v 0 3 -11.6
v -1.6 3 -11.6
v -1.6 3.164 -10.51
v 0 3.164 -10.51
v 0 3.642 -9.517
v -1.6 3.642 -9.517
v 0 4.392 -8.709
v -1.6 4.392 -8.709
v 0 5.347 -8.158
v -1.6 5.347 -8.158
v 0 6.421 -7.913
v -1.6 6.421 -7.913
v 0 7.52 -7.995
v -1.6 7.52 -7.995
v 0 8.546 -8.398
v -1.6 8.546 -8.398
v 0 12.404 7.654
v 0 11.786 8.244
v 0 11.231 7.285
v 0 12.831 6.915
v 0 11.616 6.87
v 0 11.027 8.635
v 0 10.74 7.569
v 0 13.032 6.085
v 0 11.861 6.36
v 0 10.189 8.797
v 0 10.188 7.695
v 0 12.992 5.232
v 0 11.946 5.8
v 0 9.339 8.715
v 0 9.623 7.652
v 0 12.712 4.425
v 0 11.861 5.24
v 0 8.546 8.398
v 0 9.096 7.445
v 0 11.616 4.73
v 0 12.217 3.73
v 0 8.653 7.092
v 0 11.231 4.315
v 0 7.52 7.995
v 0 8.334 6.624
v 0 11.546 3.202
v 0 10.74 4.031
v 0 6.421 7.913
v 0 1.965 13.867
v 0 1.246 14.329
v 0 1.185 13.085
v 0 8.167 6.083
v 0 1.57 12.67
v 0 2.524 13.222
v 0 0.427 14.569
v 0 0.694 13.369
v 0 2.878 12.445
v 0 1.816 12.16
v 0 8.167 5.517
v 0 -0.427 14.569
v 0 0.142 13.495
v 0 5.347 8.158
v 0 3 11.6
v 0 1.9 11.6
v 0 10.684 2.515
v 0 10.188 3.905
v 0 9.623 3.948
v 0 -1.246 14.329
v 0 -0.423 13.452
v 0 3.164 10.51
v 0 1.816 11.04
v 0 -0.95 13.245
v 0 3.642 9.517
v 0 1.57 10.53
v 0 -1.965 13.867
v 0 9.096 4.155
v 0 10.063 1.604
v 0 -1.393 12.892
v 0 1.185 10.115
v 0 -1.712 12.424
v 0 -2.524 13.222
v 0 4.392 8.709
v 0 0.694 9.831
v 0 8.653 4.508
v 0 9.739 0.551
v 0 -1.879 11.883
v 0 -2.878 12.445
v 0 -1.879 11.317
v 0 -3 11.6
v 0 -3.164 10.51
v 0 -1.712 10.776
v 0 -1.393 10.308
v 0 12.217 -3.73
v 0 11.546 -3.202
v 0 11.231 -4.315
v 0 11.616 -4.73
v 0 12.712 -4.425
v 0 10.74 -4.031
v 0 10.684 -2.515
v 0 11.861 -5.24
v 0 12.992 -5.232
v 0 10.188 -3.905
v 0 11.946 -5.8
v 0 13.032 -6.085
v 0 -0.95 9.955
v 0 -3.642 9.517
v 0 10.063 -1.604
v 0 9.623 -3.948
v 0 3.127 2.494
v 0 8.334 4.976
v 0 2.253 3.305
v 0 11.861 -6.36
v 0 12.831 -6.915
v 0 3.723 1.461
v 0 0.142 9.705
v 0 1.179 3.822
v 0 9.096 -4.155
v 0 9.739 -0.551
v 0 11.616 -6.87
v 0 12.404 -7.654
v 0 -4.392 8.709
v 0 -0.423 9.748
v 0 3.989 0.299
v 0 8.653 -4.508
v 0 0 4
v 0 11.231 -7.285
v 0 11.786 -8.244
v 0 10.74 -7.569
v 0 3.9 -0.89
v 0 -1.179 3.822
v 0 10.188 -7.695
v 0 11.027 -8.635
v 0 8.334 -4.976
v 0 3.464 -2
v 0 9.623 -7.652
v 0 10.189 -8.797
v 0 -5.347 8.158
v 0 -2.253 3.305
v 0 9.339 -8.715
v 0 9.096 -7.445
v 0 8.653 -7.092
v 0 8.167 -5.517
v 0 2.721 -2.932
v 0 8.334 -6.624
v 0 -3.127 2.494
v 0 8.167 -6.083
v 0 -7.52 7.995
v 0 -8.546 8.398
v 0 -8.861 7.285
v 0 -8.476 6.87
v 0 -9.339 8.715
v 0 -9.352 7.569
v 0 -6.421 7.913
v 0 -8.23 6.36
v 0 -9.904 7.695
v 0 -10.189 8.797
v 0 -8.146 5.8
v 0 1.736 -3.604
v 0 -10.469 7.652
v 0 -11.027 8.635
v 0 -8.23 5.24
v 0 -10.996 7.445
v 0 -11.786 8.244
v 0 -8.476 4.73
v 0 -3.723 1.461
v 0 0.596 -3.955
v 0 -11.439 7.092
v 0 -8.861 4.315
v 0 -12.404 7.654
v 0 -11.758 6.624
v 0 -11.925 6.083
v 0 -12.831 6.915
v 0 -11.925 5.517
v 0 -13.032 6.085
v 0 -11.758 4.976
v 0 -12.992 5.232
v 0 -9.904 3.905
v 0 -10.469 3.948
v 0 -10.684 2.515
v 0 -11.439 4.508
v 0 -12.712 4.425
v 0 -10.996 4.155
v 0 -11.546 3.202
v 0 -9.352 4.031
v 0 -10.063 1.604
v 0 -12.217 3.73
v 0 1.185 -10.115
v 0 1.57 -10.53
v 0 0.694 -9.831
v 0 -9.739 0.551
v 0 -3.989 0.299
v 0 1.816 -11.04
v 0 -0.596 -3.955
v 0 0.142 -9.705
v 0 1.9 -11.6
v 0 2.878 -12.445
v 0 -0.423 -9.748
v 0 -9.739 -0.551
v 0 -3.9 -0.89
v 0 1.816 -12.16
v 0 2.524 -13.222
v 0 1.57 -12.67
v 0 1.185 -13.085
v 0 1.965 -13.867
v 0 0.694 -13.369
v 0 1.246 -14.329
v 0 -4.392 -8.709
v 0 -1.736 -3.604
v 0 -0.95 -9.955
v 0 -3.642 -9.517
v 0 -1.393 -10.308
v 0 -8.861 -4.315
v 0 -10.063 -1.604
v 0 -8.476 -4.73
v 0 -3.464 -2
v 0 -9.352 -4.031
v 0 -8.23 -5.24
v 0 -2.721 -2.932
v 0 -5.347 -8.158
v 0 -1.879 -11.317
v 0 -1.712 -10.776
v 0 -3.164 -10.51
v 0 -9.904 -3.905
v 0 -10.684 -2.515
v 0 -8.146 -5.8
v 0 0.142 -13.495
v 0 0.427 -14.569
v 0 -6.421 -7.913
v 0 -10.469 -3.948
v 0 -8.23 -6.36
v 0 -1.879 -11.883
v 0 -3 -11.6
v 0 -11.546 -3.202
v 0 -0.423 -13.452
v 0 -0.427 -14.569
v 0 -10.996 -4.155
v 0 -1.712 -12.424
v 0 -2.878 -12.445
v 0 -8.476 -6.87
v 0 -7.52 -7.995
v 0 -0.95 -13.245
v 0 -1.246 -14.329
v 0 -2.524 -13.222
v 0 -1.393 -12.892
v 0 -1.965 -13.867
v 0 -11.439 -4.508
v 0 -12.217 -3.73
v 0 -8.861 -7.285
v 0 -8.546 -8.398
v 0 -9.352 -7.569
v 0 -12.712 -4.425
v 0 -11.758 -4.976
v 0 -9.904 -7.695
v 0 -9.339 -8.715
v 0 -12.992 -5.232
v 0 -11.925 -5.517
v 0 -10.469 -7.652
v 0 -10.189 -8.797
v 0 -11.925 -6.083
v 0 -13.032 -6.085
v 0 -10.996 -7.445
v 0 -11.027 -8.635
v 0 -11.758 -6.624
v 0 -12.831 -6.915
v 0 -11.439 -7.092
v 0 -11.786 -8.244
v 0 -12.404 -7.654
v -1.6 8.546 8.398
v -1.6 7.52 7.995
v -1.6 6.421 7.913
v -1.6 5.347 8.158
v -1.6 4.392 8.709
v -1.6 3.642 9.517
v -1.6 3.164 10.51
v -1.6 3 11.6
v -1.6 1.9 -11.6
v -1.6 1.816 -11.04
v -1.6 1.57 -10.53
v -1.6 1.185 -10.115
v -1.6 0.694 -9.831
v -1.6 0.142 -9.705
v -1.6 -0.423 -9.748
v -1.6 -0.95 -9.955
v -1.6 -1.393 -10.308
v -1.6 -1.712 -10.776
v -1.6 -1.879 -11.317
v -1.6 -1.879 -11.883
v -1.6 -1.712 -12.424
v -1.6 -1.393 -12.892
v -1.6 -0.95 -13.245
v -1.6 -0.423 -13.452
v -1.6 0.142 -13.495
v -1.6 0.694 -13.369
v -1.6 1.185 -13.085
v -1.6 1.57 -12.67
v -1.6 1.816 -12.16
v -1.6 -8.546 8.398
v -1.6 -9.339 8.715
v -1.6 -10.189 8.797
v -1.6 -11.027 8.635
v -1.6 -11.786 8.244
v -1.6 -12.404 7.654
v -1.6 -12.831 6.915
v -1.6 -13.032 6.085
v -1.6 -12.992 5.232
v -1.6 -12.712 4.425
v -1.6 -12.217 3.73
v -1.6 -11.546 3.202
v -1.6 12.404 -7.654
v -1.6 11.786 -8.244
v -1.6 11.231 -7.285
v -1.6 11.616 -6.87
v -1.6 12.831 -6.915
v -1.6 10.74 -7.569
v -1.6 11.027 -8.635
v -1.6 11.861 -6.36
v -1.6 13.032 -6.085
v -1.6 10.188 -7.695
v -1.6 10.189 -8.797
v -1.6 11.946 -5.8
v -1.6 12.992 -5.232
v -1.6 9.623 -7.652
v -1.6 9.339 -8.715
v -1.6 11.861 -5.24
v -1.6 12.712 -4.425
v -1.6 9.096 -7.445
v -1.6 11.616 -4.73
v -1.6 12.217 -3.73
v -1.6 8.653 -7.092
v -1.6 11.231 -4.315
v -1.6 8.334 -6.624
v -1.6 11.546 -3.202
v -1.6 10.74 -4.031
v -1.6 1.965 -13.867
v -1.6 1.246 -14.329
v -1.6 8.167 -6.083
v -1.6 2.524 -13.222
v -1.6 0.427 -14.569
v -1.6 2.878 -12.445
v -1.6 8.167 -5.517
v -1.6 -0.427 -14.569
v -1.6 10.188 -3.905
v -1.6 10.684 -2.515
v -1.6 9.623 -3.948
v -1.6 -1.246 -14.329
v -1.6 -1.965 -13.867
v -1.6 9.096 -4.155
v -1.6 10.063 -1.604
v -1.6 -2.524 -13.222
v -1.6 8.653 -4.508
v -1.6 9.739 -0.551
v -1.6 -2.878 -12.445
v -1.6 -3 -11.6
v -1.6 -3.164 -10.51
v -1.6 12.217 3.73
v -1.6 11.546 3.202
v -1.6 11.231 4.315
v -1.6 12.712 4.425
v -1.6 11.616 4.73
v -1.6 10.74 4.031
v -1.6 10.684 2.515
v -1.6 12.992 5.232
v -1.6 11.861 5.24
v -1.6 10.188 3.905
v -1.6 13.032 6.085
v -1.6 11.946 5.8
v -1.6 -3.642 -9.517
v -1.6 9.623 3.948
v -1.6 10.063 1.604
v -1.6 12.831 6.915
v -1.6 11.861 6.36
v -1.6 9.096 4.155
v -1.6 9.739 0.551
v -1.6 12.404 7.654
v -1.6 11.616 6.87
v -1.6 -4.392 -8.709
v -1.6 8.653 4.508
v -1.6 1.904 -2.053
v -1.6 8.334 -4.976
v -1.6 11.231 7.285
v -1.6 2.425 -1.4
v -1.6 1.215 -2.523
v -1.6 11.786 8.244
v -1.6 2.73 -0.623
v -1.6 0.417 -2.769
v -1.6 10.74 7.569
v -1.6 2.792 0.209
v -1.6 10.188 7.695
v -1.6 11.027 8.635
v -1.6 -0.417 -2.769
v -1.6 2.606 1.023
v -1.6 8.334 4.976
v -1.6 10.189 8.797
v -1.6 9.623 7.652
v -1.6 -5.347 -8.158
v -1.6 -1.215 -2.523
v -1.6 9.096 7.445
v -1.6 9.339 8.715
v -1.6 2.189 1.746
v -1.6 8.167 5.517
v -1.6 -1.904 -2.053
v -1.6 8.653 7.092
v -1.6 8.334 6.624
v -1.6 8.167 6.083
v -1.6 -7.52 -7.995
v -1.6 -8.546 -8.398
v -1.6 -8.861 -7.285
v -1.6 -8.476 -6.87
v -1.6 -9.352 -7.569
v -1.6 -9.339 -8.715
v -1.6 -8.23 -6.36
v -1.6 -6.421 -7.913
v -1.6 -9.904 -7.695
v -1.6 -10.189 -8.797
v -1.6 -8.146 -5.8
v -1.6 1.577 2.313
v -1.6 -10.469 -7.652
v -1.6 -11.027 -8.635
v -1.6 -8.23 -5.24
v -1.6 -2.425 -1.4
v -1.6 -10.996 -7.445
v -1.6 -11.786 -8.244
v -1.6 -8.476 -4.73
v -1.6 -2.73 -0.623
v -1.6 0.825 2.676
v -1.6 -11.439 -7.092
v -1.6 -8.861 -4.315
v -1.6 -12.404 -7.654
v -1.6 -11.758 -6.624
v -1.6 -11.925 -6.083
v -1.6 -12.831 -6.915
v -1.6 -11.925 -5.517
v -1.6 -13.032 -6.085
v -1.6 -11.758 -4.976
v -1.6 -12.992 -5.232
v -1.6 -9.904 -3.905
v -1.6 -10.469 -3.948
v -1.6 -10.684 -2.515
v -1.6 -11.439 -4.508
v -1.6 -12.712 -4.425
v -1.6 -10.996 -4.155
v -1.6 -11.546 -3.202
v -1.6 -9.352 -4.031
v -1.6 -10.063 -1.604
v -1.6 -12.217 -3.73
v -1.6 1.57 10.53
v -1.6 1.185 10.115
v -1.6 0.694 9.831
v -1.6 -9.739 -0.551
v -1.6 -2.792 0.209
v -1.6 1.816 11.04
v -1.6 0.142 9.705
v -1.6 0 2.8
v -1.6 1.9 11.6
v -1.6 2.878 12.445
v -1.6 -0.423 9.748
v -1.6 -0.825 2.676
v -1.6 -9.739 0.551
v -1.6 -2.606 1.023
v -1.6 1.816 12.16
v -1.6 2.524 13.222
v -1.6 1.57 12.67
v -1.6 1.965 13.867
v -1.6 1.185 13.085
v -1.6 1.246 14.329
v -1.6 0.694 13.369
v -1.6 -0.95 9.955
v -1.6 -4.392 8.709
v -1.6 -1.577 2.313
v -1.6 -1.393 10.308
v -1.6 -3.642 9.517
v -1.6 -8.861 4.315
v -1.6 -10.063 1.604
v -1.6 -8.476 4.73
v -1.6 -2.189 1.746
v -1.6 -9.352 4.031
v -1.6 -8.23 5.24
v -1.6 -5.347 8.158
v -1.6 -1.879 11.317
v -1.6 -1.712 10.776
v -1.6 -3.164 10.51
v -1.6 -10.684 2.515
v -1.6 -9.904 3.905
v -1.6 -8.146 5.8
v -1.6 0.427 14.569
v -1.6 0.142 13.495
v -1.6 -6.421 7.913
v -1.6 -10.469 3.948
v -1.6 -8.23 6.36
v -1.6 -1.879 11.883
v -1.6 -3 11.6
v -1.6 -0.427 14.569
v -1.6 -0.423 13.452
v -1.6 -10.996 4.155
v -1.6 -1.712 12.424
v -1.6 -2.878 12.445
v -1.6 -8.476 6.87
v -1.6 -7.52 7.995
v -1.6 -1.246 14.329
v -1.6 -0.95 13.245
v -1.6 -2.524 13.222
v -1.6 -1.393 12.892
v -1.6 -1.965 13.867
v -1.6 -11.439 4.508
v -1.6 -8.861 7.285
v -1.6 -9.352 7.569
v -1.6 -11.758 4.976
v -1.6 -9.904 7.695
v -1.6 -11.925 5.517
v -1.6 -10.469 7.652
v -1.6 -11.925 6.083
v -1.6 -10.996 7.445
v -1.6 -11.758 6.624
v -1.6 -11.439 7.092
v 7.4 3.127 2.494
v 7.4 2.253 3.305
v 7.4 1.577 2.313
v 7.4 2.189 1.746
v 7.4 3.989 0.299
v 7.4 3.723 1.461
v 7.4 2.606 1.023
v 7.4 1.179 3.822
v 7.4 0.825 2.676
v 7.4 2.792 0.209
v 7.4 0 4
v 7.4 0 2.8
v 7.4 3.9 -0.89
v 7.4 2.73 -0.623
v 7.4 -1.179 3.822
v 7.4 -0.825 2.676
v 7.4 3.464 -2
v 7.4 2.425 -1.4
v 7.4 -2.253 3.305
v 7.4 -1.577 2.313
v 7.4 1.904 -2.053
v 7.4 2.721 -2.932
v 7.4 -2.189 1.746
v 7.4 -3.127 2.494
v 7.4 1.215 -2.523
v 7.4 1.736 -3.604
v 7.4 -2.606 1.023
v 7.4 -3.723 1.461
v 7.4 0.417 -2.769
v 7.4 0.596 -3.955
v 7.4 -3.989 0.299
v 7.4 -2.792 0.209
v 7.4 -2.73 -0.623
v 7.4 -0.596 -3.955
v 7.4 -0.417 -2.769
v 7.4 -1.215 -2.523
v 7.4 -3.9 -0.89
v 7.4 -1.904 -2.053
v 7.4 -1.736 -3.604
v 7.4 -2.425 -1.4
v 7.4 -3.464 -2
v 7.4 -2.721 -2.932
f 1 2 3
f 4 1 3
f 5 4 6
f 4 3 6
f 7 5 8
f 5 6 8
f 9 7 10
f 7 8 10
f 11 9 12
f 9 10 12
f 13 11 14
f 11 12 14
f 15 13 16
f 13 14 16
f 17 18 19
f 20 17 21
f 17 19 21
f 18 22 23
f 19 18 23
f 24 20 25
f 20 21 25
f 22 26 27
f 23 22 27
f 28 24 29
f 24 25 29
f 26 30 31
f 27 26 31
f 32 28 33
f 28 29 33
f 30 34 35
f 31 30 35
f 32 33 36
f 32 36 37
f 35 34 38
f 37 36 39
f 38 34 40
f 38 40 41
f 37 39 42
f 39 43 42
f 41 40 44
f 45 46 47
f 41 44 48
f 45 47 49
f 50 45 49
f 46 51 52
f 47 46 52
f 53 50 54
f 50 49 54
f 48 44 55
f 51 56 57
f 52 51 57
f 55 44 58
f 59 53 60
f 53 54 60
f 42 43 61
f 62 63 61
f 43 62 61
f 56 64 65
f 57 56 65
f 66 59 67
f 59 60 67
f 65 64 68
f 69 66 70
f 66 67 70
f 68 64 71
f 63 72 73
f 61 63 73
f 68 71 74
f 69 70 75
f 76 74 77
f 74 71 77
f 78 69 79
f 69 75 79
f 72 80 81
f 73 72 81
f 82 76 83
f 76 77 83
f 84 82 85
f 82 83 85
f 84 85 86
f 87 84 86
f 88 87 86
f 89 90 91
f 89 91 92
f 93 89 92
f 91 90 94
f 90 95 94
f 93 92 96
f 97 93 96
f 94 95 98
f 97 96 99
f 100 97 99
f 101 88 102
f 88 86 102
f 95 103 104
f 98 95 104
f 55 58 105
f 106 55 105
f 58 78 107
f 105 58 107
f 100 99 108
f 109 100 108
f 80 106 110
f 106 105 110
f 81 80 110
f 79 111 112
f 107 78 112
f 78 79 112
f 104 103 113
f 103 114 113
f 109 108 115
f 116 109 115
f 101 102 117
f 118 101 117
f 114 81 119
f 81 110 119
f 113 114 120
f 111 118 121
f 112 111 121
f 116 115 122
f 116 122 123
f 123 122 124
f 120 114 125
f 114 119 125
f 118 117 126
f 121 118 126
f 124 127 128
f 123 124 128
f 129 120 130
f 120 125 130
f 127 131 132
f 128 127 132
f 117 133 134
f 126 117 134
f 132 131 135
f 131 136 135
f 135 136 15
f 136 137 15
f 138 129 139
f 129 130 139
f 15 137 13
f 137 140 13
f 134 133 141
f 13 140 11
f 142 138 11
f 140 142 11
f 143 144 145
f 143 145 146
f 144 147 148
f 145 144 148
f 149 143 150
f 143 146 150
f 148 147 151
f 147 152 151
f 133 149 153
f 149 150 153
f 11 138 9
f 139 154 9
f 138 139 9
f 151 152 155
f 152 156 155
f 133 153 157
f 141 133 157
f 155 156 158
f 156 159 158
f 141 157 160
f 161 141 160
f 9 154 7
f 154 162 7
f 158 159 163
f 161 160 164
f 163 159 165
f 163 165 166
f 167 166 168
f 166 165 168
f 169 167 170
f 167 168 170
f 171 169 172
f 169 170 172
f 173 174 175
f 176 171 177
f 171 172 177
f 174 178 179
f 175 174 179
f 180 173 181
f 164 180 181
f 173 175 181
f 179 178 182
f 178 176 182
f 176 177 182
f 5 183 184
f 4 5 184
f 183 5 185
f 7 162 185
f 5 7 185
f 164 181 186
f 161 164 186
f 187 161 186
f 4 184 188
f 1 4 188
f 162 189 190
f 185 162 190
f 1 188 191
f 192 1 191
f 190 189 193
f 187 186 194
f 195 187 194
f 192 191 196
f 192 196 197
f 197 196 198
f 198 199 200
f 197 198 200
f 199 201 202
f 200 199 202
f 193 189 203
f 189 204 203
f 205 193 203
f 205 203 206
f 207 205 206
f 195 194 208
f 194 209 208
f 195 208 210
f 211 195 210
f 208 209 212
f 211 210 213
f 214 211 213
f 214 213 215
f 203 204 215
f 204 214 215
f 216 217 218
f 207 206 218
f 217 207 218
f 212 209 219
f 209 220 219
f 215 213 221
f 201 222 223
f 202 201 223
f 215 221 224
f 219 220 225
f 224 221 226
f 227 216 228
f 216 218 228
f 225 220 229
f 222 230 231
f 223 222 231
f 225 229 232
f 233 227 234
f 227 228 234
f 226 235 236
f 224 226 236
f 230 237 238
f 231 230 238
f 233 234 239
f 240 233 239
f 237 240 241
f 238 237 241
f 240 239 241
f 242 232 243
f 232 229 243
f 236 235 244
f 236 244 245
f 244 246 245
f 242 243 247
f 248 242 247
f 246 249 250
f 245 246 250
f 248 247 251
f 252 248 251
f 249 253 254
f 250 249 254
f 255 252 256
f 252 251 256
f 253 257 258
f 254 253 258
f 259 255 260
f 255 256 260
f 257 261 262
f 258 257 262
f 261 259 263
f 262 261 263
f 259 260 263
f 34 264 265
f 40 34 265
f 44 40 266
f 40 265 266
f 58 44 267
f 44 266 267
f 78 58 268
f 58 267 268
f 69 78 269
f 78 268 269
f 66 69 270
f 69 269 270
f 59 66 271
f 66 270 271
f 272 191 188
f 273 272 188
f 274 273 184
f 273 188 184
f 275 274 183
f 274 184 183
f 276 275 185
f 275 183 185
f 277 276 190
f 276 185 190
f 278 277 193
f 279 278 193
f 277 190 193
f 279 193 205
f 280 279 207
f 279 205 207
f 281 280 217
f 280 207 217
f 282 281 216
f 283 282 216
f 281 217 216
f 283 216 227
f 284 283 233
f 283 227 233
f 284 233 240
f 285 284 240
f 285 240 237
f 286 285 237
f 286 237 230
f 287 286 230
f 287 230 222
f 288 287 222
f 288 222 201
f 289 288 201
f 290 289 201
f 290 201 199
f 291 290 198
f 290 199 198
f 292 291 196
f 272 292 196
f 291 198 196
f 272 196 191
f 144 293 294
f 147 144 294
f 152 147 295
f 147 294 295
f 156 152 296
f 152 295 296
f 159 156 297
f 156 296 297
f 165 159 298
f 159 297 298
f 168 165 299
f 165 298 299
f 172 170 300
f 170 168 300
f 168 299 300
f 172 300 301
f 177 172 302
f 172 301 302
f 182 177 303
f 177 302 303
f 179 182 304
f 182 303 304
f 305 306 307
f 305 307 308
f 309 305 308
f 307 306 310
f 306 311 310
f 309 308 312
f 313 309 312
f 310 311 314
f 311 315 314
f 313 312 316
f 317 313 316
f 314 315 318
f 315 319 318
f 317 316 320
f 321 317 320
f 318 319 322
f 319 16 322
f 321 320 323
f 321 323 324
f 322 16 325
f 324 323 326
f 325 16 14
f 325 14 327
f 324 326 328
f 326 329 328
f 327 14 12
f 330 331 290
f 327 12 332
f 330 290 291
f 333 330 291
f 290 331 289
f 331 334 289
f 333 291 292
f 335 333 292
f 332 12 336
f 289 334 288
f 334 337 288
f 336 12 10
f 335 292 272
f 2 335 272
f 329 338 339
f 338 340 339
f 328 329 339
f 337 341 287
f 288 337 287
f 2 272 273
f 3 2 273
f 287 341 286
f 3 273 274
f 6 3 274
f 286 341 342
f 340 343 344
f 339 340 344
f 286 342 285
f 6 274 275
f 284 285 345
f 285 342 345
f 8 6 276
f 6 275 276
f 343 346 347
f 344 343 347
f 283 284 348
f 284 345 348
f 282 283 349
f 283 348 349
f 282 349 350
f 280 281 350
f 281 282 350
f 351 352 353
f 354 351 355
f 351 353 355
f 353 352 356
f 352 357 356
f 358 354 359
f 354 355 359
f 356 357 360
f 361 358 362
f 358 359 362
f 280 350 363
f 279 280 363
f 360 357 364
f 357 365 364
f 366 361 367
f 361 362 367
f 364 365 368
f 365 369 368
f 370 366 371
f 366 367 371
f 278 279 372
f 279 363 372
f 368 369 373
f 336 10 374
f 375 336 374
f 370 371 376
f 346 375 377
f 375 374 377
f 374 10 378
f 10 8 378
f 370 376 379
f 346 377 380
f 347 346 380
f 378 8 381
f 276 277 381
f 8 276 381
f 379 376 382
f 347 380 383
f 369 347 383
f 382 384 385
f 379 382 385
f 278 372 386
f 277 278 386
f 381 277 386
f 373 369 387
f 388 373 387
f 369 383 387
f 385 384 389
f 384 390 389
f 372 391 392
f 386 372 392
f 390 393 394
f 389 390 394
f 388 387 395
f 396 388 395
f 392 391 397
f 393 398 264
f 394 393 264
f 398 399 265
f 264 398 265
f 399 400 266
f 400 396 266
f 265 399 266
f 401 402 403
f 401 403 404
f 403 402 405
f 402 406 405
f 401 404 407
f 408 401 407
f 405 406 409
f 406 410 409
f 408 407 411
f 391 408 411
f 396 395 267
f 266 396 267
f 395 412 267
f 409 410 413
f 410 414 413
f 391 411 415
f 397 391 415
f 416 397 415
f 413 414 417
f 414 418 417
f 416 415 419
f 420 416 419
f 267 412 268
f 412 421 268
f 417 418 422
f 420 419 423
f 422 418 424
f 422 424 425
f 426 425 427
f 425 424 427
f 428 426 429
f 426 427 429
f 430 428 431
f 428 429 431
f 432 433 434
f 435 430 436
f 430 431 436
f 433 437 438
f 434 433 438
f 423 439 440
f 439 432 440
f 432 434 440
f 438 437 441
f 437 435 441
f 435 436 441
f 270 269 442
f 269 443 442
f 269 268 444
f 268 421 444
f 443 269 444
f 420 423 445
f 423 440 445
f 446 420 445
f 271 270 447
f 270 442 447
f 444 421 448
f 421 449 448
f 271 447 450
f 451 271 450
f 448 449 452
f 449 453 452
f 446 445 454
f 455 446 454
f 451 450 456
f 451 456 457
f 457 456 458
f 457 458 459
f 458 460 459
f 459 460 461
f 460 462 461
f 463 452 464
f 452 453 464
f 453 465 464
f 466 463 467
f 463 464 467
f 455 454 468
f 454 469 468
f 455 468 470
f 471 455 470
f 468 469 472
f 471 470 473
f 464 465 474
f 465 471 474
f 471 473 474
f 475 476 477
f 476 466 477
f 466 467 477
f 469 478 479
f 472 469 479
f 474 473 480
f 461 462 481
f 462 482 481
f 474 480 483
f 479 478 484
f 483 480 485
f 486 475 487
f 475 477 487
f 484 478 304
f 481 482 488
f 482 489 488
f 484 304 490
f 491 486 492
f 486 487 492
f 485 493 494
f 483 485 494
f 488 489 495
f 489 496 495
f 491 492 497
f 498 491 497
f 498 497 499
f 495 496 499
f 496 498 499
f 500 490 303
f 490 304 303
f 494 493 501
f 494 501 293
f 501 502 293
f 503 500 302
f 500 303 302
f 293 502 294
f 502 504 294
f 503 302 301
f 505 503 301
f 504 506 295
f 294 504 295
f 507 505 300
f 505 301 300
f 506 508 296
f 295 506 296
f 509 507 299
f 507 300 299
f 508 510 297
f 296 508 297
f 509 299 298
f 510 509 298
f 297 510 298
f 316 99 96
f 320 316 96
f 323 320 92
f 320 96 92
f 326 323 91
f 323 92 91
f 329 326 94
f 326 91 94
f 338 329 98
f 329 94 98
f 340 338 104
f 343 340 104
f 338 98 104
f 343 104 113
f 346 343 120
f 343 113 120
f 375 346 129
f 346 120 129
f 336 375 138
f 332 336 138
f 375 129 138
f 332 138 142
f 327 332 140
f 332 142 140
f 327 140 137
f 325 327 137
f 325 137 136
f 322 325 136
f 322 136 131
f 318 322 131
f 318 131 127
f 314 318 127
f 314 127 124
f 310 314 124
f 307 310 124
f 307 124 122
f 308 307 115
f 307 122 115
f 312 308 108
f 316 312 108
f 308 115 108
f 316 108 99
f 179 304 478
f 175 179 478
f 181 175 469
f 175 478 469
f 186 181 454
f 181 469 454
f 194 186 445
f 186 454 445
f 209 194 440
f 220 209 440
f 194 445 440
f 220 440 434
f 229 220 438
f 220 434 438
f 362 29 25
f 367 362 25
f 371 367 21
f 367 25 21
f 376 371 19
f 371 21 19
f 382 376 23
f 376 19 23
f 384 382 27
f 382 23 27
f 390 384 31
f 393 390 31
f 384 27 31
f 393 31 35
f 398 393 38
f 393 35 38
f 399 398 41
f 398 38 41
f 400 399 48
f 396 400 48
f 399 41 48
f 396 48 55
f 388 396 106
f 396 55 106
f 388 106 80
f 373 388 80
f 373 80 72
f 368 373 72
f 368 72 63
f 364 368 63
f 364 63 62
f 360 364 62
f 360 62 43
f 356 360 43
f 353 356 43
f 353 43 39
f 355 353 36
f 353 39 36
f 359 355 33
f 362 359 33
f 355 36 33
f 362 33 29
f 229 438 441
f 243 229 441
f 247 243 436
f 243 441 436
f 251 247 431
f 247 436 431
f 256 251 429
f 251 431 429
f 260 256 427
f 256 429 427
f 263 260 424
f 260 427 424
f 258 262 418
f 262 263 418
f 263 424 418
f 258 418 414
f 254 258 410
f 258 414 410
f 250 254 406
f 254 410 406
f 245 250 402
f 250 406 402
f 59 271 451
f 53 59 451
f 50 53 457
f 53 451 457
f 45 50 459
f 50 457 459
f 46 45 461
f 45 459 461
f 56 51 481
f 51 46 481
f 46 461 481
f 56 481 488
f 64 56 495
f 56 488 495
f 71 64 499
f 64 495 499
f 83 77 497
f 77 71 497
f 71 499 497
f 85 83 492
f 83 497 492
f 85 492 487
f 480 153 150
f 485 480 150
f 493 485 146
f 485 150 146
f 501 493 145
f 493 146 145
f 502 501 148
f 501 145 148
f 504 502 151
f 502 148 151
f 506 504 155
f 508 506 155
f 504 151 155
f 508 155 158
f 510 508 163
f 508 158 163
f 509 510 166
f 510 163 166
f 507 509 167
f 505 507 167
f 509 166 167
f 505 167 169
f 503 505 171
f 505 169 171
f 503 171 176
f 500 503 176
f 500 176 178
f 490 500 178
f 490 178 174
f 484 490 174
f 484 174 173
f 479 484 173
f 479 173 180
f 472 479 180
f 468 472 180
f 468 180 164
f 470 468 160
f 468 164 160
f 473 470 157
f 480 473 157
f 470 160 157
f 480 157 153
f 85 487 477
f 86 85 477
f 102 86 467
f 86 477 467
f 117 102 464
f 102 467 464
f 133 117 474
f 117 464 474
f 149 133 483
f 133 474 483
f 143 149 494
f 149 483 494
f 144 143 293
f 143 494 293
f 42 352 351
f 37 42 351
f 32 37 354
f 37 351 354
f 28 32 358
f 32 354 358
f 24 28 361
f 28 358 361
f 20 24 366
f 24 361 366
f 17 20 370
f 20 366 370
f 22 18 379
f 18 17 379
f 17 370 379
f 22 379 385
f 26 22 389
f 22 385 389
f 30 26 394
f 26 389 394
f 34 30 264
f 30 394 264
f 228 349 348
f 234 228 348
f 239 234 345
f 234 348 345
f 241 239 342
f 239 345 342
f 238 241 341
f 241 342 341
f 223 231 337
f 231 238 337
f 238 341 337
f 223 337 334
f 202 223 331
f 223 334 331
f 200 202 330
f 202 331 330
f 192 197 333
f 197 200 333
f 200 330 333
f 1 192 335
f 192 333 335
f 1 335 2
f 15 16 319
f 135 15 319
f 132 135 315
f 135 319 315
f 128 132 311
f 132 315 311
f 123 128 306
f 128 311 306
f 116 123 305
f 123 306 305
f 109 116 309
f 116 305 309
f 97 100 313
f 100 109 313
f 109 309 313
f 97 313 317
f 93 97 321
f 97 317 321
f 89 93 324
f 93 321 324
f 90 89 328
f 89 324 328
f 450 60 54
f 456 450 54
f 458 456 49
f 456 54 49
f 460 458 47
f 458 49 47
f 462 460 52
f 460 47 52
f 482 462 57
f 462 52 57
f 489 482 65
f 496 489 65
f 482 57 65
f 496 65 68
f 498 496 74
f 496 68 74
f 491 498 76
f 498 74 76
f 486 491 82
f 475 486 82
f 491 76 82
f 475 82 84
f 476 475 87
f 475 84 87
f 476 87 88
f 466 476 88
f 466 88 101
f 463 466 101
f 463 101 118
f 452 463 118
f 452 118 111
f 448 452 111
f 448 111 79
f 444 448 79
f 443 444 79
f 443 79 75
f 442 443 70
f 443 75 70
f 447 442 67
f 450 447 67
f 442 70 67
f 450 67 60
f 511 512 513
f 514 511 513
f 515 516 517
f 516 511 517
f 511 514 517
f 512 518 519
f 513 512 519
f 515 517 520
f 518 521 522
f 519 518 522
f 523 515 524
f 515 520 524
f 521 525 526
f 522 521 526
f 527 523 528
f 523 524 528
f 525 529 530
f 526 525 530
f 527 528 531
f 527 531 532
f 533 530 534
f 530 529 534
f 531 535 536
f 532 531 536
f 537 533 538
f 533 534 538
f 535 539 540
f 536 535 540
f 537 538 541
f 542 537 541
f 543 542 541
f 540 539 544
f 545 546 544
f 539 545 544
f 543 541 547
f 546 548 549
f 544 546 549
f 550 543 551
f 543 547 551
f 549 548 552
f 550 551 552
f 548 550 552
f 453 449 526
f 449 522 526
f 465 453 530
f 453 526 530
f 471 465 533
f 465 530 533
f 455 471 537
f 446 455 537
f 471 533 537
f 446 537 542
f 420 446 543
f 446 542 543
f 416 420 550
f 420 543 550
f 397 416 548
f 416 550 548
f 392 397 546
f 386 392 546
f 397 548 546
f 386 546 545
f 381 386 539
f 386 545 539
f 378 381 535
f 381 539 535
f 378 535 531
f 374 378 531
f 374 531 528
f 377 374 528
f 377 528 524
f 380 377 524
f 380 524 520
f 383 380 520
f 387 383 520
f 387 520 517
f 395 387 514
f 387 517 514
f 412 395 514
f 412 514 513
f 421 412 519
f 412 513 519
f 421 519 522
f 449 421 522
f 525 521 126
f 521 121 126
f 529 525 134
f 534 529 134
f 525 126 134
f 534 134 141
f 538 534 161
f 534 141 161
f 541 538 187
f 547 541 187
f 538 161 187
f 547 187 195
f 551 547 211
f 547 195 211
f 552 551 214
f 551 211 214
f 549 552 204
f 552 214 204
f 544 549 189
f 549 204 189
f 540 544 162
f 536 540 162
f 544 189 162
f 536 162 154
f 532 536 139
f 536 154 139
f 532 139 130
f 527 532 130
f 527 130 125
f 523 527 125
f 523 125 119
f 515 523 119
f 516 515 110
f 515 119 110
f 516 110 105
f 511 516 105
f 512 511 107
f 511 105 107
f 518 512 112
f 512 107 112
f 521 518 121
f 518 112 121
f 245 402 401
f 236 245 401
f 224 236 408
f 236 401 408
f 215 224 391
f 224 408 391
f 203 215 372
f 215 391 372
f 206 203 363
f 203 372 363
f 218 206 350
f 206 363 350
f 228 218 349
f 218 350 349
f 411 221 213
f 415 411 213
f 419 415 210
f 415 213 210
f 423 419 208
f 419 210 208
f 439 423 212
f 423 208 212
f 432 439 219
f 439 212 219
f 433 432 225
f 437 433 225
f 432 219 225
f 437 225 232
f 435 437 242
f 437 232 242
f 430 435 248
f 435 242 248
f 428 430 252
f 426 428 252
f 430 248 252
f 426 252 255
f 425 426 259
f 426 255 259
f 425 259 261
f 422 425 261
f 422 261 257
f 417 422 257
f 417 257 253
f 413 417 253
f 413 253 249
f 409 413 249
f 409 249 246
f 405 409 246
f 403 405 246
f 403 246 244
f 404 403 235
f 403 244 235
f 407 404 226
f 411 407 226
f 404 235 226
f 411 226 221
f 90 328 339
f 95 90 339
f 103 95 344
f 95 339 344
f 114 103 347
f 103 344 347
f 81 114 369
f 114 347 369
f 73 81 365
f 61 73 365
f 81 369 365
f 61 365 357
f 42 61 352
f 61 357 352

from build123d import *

# Parameters (mm, degrees)
F2_R     = 1.9
F3_DEPTH = 1.6
F5_START = -1.601
F5_DEPTH = 9.002


with BuildPart() as f1:
    # F0 (on Front) → F1 (revolve)
    with BuildSketch(Plane.XZ):
        Polygon((-1.6, 14.6), (-1.6, 2.8), (7.4, 2.8), (7.4, 4), (0, 4), (0, 14.6), align=None)
    revolve(axis=Axis((3.7, 0, 0), (1, 0, 0)))

    # F2 (on Right) → F3 (cut, through all)
    with BuildSketch(Plane.YZ):
        with Locations((0, 11.6)):
            Circle(F2_R)
        with Locations((-10.0458946839, 5.8)):
            Circle(F2_R)
        with Locations((-10.0458946839, -5.8)):
            Circle(F2_R)
        with Locations((0, -11.6)):
            Circle(F2_R)
        with Locations((10.0458946839, -5.8)):
            Circle(F2_R)
        with Locations((10.0458946839, 5.8)):
            Circle(F2_R)
    extrude(amount=-F3_DEPTH, mode=Mode.SUBTRACT)

    # F4 (on Right) → F5 (intersect)
    with BuildSketch(Plane.YZ.offset(F5_START)):
        with BuildLine():
            ThreePointArc((8.5458946839, 8.3980762114), (4.8486315613, 8.3980762114), (3, 11.6))
            ThreePointArc((3, 11.6), (0, 14.6), (-3, 11.6))
            ThreePointArc((-3, 11.6), (-4.8486315613, 8.3980762114), (-8.5458946839, 8.3980762114))
            ThreePointArc((-8.5458946839, 8.3980762114), (-12.6439708953, 7.3), (-11.5458946839, 3.2019237886))
            ThreePointArc((-11.5458946839, 3.2019237886), (-9.6972631226, 0), (-11.5458946839, -3.2019237886))
            ThreePointArc((-11.5458946839, -3.2019237886), (-12.6439708953, -7.3), (-8.5458946839, -8.3980762114))
            ThreePointArc((-8.5458946839, -8.3980762114), (-4.8486315613, -8.3980762114), (-3, -11.6))
            ThreePointArc((-3, -11.6), (0, -14.6), (3, -11.6))
            ThreePointArc((3, -11.6), (4.8486315613, -8.3980762114), (8.5458946839, -8.3980762114))
            ThreePointArc((8.5458946839, -8.3980762114), (12.6439708953, -7.3), (11.5458946839, -3.2019237886))
            ThreePointArc((11.5458946839, -3.2019237886), (9.6972631226, 0), (11.5458946839, 3.2019237886))
            ThreePointArc((11.5458946839, 3.2019237886), (12.6439708953, 7.3), (8.5458946839, 8.3980762114))
        make_face()
    extrude(amount=F5_DEPTH, mode=Mode.INTERSECT)


solid = f1.part
